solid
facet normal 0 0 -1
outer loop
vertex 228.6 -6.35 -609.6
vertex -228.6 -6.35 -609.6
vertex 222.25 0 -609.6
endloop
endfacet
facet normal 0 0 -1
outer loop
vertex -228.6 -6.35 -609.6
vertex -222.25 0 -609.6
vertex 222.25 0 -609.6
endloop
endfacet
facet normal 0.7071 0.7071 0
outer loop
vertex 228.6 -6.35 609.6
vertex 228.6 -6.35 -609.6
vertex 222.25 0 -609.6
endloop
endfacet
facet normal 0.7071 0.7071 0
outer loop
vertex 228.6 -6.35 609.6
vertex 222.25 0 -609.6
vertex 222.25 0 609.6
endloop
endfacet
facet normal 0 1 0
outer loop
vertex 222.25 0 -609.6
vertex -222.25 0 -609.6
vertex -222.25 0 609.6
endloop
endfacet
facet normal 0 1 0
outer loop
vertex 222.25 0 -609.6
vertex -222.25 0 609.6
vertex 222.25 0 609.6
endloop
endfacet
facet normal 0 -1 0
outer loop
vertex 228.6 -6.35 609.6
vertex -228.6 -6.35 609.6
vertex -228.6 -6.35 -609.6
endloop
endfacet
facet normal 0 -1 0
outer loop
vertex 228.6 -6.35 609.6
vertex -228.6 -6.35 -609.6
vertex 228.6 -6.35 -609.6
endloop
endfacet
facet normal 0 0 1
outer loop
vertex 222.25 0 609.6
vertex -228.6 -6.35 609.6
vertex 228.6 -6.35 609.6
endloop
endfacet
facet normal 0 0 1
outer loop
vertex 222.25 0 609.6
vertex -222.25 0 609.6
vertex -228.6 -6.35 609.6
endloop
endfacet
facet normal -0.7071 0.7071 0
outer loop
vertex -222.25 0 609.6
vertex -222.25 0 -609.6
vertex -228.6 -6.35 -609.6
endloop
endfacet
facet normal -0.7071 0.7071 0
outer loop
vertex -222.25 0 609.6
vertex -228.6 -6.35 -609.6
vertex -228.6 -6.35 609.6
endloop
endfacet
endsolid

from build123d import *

# Parameters (mm, degrees)
F0_W     = 457.2
F0_H     = 1219.2
F1_DEPTH = 6.35
F2_SIZE  = 6.34999
F3_SIZE  = 6.34999


# Not quite as in the source:
# - a fillet or chamfer is up to 0.001 mm smaller than in the source, because OpenCascade refuses the exact size


with BuildPart() as f1:
    # F0 (on Front) → F1 (new body)
    with BuildSketch(Plane.XZ):
        Rectangle(F0_W, F0_H)
    extrude(amount=F1_DEPTH)

    # F2 (size 6.35 in the source; OpenCascade refuses exactly that, so slightly less here)
    f2_edges = [f1.edges().sort_by_distance(p)[0] for p in [
        (-228.6, 0, 0),
    ]]
    chamfer(f2_edges, length=F2_SIZE)

    # F3 (size 6.35 in the source; OpenCascade refuses exactly that, so slightly less here)
    f3_edges = [f1.edges().sort_by_distance(p)[0] for p in [
        (228.6, 0, 0),
    ]]
    chamfer(f3_edges, length=F3_SIZE)


solid = f1.part
